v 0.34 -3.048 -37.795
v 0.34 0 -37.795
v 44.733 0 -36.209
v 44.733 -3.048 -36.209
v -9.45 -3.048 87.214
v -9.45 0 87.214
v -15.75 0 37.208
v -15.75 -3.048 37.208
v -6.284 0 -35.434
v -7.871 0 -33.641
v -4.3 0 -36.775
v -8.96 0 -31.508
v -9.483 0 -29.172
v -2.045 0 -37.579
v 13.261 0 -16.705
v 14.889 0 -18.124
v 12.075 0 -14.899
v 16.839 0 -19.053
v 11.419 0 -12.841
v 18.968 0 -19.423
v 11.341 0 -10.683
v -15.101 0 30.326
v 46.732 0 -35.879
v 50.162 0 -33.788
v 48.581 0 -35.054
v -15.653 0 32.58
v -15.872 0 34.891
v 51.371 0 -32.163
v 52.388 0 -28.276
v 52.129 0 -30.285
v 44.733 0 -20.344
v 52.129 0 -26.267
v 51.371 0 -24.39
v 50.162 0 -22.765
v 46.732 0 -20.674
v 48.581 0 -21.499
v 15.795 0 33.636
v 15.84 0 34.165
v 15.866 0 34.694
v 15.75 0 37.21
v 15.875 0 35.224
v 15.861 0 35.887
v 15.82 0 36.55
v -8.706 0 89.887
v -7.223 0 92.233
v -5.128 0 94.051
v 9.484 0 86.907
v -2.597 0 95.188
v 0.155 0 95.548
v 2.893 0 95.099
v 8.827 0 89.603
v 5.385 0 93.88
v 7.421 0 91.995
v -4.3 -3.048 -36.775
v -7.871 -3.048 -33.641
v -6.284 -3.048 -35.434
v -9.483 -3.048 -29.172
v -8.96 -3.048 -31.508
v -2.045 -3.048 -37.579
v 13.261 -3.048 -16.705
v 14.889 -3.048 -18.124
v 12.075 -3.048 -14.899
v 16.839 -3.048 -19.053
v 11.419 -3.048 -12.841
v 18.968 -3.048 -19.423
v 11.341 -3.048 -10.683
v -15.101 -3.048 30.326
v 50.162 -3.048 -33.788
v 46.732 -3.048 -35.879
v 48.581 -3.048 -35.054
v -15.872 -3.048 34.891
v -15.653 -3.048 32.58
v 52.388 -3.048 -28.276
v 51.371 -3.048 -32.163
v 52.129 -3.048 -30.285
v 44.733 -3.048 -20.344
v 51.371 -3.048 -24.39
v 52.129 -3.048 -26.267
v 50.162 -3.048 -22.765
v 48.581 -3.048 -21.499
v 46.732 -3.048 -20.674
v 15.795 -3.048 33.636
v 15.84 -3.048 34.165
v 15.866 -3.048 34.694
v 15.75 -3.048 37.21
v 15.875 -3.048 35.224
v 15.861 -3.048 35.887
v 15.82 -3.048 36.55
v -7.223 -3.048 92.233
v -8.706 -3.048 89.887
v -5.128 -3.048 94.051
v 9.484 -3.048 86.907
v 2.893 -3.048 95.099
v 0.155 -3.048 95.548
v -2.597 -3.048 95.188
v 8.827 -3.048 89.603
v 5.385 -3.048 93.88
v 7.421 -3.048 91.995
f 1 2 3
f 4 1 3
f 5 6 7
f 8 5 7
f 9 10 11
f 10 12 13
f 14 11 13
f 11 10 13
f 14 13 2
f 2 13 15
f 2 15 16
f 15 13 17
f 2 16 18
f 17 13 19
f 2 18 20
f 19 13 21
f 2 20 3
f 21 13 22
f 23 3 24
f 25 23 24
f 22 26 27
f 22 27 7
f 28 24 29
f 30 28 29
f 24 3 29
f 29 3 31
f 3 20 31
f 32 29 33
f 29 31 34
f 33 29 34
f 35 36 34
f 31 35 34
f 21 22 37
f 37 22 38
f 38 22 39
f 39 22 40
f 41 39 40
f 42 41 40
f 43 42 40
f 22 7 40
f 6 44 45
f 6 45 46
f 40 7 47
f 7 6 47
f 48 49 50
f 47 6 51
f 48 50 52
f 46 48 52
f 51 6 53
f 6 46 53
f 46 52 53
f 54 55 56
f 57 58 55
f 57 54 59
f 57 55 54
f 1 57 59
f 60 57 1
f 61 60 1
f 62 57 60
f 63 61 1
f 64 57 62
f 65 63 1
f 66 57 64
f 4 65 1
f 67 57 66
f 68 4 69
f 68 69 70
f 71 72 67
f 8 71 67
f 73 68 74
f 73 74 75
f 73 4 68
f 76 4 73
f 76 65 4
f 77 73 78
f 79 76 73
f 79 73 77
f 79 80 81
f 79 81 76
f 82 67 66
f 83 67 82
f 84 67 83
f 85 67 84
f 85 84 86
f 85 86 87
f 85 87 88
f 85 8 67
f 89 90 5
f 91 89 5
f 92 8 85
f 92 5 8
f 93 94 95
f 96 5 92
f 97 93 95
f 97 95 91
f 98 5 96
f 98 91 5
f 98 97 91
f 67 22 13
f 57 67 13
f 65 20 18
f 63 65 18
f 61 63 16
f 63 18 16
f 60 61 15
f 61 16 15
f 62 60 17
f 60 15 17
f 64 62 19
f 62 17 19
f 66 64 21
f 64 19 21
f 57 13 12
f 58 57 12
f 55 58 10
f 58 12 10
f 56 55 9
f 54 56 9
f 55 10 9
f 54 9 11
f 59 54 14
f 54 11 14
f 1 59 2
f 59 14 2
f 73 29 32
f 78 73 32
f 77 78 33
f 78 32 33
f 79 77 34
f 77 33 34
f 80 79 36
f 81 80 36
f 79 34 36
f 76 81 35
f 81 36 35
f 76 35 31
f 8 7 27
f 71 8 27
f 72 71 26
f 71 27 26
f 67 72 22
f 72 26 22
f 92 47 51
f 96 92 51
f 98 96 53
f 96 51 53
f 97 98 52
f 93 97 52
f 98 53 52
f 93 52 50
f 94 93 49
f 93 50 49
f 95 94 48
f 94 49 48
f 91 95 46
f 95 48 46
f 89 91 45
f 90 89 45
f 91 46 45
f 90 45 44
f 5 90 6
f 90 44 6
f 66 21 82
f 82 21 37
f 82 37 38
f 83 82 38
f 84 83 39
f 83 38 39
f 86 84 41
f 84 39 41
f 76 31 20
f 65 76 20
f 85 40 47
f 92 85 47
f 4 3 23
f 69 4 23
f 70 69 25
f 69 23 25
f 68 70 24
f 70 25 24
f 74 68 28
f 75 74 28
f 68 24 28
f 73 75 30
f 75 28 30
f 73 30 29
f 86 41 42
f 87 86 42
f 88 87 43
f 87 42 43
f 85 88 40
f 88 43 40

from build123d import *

# Parameters (mm, degrees)
F0_R     = 1.5875
F1_DEPTH = 3.048


with BuildPart() as f1:
    # F0 (on Front) → F1 (new body)
    with BuildSketch(Plane.XZ):
        with BuildLine():
            Line((-15.100703, 30.326465), (-15.750488, 37.208226))
            ThreePointArc((-15.750488, 37.208226), (-15.804704, 33.731549), (-15.100703, 30.326465))
        make_face()
        with BuildLine():
            ThreePointArc((-9.450293, 87.214476), (-0.596483, 76.517546), (9.525, 86.023851))
            ThreePointArc((9.525, 86.023851), (9.514734, 86.465966), (9.483957, 86.907129))
            ThreePointArc((9.483957, 86.907129), (0.154593, 95.547596), (-9.450293, 87.214476))
        make_face()
        with Locations((0, 86.023851)):
            Circle(F0_R, mode=Mode.SUBTRACT)
        with BuildLine():
            ThreePointArc((9.525, -28.276149), (-0.448187, -18.761699), (-9.482822, -29.17153))
            ThreePointArc((-9.482822, -29.17153), (-6.283976, -35.434171), (0.340179, -37.795073))
            ThreePointArc((0.340179, -37.795073), (6.854408, -34.889977), (9.525, -28.276149))
        make_face()
        with Locations((0, -28.276149)):
            Circle(F0_R, mode=Mode.SUBTRACT)
        with BuildLine():
            ThreePointArc((44.733482, -20.343713), (36.5125, -28.276149), (44.733482, -36.208585))
            ThreePointArc((44.733482, -36.208585), (50.162007, -33.787672), (52.3875, -28.276149))
            ThreePointArc((52.3875, -28.276149), (50.162007, -22.764626), (44.733482, -20.343713))
        make_face()
        with Locations((44.45, -28.276149)):
            Circle(F0_R, mode=Mode.SUBTRACT)
        with BuildLine():
            ThreePointArc((9.483957, 86.907129), (9.514734, 86.465966), (9.525, 86.023851))
            ThreePointArc((9.525, 86.023851), (-0.596483, 76.517546), (-9.450293, 87.214476))
            Line((-9.450293, 87.214476), (-15.750488, 37.208226))
            ThreePointArc((-15.750488, 37.208226), (-0.000795, 51.098851), (15.750289, 37.209804))
            Line((15.750289, 37.209804), (9.483957, 86.907129))
        make_face()
        with Locations((-6.508044, 71.749051)):
            Circle(F0_R, mode=Mode.SUBTRACT)
        with BuildLine():
            ThreePointArc((15.795426, 33.636351), (1.691005, 19.439171), (-15.100703, 30.326465))
            Line((-15.100703, 30.326465), (-9.482822, -29.17153))
            ThreePointArc((-9.482822, -29.17153), (-0.448187, -18.761699), (9.525, -28.276149))
            ThreePointArc((9.525, -28.276149), (6.854408, -34.889977), (0.340179, -37.795073))
            Line((0.340179, -37.795073), (44.733482, -36.208585))
            ThreePointArc((44.733482, -36.208585), (36.5125, -28.276149), (44.733482, -20.343713))
            Line((44.733482, -20.343713), (18.9676, -19.422915))
            ThreePointArc((18.9676, -19.422915), (13.2612, -16.70479), (11.341187, -10.682767))
            Line((11.341187, -10.682767), (15.795426, 33.636351))
        make_face()
        with BuildLine():
            ThreePointArc((15.875, 35.223851), (15.843792, 36.218783), (15.750289, 37.209804))
            ThreePointArc((15.750289, 37.209804), (-0.000795, 51.098851), (-15.750488, 37.208226))
            Line((-15.750488, 37.208226), (-15.100703, 30.326465))
            ThreePointArc((-15.100703, 30.326465), (1.691005, 19.439171), (15.795426, 33.636351))
            ThreePointArc((15.795426, 33.636351), (15.855094, 34.429104), (15.875, 35.223851))
        make_face()
        with Locations((0, 35.223851)):
            Circle(F0_R, mode=Mode.SUBTRACT)
        with Locations((-6.508044, 71.749051)):
            Circle(F0_R)
        with Locations((0, 35.223851)):
            Circle(F0_R)
        with Locations((0, 86.023851)):
            Circle(F0_R)
        with Locations((44.45, -28.276149)):
            Circle(F0_R)
        with Locations((0, -28.276149)):
            Circle(F0_R)
    extrude(amount=F1_DEPTH)


solid = f1.part
